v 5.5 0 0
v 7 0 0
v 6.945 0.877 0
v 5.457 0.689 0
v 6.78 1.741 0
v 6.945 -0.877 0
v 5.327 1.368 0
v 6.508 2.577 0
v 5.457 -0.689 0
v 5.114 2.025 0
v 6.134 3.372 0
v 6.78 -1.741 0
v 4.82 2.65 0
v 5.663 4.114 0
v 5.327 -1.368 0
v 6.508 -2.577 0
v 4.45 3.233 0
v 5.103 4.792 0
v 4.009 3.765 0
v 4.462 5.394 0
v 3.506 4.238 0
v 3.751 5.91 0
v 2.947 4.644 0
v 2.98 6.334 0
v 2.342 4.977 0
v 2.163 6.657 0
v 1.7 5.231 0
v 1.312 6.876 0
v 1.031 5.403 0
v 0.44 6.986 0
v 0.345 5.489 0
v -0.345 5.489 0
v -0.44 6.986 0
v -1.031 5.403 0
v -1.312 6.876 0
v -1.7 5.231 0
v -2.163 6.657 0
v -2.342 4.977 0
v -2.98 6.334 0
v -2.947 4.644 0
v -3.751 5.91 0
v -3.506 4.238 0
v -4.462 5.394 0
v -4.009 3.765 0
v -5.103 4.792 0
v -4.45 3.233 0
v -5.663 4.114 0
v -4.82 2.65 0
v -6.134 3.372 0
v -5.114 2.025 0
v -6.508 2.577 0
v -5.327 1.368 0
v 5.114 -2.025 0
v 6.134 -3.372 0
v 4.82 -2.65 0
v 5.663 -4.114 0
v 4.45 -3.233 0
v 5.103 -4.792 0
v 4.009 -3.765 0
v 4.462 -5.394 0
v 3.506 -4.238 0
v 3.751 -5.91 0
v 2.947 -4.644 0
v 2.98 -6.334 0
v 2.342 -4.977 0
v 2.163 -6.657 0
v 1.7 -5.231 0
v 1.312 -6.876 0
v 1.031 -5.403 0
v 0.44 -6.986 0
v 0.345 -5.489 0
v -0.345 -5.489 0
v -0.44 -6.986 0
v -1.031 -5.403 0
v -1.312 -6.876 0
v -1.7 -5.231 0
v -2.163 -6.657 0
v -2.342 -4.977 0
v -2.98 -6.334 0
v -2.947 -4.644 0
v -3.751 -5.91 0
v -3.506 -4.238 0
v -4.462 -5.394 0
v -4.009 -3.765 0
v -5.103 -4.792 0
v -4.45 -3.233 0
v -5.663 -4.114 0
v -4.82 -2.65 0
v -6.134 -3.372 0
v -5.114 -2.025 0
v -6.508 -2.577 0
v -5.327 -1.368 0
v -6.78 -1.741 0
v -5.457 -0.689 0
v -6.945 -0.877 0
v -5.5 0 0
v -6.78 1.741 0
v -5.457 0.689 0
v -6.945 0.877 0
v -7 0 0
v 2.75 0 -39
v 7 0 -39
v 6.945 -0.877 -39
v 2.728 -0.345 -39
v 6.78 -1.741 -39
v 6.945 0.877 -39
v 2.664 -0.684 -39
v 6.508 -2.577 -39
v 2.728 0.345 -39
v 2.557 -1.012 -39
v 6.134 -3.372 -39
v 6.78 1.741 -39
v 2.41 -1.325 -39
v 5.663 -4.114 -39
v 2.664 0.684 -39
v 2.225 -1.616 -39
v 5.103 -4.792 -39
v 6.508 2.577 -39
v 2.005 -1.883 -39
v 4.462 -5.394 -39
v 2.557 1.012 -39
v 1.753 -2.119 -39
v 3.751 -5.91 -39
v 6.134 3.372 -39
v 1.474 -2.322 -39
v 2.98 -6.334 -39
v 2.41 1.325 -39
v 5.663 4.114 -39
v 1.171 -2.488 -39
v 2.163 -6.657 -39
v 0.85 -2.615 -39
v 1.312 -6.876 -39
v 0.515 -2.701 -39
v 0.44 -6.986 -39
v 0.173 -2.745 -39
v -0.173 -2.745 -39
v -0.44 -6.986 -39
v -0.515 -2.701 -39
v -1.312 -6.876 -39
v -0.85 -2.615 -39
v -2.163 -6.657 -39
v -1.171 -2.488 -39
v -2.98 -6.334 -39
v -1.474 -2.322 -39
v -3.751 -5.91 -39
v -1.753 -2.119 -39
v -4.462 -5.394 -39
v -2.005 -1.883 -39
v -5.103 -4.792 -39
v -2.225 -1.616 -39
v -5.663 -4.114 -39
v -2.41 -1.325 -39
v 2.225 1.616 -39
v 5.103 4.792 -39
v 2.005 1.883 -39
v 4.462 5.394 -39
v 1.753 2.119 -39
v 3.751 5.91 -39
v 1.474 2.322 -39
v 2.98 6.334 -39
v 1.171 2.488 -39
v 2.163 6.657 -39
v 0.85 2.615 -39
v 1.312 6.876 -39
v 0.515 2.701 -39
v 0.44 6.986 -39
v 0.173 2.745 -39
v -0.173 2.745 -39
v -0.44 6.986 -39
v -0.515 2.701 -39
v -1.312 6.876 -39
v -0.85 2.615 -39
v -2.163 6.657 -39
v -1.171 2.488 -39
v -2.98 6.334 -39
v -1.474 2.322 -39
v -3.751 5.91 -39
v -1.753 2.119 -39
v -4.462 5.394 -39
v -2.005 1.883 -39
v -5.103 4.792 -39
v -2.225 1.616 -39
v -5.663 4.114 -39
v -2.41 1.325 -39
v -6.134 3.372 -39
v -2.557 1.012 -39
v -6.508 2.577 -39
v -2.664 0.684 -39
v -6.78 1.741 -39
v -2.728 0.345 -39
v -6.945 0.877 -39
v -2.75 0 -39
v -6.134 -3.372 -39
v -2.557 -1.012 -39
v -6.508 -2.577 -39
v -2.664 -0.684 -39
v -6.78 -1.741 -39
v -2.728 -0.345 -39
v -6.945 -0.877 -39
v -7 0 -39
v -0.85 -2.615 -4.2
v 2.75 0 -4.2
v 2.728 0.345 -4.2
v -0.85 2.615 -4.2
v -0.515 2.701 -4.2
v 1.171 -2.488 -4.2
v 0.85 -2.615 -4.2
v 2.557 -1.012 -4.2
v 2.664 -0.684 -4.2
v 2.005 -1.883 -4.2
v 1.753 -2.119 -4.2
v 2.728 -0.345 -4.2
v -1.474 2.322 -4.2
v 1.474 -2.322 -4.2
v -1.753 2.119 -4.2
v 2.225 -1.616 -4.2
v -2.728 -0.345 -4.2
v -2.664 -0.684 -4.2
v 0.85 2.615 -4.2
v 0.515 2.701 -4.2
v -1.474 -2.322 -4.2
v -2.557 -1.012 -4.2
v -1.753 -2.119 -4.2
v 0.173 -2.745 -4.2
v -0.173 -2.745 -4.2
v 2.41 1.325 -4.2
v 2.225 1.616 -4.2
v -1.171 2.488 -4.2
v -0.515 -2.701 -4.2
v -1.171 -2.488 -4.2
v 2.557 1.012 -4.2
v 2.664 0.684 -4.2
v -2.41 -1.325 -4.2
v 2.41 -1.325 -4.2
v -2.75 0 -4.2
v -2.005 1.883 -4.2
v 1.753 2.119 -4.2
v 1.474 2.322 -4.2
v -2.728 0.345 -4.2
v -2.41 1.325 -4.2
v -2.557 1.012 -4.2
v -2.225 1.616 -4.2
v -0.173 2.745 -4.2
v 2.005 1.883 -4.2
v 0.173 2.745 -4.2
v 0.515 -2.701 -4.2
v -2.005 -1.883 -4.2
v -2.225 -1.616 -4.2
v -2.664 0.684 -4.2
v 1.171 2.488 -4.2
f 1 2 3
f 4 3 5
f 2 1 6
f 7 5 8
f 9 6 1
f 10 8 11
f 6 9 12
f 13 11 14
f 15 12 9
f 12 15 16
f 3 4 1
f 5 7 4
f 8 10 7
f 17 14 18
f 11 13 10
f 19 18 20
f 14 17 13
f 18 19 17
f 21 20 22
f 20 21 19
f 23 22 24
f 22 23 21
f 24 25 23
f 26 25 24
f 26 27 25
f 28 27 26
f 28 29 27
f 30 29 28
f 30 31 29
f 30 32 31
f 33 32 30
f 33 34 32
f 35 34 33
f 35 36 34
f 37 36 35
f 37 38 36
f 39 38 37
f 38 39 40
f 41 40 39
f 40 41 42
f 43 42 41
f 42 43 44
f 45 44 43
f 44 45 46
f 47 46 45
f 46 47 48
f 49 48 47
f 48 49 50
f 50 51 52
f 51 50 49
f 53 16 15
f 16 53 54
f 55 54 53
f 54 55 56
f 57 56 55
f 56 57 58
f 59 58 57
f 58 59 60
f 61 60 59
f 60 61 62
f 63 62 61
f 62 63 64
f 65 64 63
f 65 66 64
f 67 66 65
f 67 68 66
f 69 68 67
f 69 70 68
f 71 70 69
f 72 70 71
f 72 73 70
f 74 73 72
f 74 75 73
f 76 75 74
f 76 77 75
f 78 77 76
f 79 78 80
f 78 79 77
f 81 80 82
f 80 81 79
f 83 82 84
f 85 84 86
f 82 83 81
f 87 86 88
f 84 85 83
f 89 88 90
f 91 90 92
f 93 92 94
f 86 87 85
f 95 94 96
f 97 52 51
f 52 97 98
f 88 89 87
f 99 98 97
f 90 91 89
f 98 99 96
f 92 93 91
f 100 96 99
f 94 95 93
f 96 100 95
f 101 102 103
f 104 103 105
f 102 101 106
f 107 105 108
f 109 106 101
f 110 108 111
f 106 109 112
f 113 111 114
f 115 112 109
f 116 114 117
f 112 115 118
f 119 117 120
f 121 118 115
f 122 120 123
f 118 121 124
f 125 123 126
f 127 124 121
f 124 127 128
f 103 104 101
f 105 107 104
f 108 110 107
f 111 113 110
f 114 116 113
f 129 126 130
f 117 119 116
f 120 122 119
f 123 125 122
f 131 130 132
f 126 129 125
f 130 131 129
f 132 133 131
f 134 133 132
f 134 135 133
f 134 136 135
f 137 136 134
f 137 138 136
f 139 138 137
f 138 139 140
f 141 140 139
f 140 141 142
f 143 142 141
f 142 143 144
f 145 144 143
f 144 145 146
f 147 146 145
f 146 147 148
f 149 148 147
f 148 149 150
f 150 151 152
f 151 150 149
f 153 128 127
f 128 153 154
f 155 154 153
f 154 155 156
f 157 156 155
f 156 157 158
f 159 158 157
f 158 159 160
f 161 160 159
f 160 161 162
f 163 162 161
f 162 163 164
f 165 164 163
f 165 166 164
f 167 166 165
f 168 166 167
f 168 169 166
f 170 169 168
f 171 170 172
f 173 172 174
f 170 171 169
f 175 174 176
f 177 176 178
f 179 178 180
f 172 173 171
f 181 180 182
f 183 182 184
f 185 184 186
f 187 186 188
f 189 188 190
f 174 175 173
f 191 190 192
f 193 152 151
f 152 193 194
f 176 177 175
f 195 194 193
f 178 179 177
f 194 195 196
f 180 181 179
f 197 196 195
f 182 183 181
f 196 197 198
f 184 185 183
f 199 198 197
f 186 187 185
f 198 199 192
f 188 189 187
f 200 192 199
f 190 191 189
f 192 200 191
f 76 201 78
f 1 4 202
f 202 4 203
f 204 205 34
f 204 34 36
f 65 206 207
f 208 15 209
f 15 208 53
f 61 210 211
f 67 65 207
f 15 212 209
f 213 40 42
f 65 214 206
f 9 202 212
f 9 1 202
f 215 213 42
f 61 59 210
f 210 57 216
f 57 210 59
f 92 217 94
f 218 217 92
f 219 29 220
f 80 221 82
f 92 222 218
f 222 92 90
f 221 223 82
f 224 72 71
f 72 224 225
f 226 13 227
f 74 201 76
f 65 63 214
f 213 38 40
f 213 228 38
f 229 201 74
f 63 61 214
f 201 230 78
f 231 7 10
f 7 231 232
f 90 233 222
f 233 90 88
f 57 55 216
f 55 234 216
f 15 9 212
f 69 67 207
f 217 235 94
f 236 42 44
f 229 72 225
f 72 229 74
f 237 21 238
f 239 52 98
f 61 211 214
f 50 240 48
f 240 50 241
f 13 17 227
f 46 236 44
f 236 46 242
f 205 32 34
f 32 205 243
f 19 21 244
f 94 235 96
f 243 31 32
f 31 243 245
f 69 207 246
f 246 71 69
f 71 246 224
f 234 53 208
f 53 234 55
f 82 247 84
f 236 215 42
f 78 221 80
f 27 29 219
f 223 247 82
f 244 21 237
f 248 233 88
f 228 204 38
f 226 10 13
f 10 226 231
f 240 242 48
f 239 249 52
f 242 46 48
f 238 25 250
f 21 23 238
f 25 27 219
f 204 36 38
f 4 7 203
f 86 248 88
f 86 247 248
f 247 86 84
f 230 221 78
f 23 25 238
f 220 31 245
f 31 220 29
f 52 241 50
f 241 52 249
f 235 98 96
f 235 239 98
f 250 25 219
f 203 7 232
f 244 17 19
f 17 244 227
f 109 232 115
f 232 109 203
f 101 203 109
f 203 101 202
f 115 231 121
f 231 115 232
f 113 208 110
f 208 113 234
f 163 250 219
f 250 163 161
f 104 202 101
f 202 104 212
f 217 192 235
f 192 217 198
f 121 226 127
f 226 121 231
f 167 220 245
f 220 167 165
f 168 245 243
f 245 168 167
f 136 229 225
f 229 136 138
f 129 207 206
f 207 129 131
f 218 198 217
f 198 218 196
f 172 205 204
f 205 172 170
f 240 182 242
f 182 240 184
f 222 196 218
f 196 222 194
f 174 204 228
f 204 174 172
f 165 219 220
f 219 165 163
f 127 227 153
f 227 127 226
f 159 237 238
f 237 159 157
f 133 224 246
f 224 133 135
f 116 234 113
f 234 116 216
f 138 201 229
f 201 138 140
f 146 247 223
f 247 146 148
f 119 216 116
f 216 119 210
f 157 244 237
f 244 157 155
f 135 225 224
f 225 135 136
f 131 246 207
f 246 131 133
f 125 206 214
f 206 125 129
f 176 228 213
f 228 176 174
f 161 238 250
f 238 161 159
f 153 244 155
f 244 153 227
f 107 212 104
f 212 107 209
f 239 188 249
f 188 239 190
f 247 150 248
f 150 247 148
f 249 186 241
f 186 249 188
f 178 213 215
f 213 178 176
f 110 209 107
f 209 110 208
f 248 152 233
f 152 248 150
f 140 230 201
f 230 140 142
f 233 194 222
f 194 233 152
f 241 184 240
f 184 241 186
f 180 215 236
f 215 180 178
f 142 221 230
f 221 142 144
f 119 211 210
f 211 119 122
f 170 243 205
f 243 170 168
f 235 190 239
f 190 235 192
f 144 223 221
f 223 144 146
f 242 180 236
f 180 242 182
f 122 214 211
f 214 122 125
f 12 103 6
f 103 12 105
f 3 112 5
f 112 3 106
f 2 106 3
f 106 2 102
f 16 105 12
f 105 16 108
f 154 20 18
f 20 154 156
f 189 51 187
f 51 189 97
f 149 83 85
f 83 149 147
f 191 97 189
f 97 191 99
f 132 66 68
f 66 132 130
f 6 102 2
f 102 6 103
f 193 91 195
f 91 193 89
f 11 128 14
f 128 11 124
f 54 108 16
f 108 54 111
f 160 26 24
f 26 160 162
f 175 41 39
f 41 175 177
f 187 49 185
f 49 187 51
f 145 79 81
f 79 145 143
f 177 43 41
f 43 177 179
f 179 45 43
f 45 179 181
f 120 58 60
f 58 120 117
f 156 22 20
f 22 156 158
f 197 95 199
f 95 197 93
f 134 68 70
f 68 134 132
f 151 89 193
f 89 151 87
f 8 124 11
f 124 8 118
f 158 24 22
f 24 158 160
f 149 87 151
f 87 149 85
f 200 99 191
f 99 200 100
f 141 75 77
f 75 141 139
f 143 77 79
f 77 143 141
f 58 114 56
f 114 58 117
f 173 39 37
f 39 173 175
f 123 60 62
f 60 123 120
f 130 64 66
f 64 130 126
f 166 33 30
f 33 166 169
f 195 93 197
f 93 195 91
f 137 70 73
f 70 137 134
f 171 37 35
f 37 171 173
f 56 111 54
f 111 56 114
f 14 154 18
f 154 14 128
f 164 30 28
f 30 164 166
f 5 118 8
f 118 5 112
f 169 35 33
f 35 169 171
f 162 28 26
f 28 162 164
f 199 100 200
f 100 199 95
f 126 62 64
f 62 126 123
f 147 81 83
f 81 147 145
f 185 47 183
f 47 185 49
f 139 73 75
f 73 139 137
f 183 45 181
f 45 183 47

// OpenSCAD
$fn = 50;


difference() {
	union() {
		translate(v = [0, 0, -39.0000000000]) {
			cylinder(h = 39, r = 7.0000000000);
		}
		cylinder(h = 0, r = 16.0000000000);
	}
	union() {
		translate(v = [0, 0, 0]) {
			rotate(a = [0, 0, 0]) {
				difference() {
					union() {
						#translate(v = [0, 0, -39.0000000000]) {
							cylinder(h = 39, r = 2.2500000000);
						}
						#translate(v = [0, 0, -4.2000000000]) {
							cylinder(h = 4.2000000000, r = 7.0000000000, r1 = 2.7500000000, r2 = 5.5000000000);
						}
						#translate(v = [0, 0, -39.0000000000]) {
							cylinder(h = 39, r = 2.7500000000);
						}
						#translate(v = [0, 0, -39.0000000000]) {
							cylinder(h = 39, r = 2.2500000000);
						}
					}
					union();
				}
			}
		}
	}
}
